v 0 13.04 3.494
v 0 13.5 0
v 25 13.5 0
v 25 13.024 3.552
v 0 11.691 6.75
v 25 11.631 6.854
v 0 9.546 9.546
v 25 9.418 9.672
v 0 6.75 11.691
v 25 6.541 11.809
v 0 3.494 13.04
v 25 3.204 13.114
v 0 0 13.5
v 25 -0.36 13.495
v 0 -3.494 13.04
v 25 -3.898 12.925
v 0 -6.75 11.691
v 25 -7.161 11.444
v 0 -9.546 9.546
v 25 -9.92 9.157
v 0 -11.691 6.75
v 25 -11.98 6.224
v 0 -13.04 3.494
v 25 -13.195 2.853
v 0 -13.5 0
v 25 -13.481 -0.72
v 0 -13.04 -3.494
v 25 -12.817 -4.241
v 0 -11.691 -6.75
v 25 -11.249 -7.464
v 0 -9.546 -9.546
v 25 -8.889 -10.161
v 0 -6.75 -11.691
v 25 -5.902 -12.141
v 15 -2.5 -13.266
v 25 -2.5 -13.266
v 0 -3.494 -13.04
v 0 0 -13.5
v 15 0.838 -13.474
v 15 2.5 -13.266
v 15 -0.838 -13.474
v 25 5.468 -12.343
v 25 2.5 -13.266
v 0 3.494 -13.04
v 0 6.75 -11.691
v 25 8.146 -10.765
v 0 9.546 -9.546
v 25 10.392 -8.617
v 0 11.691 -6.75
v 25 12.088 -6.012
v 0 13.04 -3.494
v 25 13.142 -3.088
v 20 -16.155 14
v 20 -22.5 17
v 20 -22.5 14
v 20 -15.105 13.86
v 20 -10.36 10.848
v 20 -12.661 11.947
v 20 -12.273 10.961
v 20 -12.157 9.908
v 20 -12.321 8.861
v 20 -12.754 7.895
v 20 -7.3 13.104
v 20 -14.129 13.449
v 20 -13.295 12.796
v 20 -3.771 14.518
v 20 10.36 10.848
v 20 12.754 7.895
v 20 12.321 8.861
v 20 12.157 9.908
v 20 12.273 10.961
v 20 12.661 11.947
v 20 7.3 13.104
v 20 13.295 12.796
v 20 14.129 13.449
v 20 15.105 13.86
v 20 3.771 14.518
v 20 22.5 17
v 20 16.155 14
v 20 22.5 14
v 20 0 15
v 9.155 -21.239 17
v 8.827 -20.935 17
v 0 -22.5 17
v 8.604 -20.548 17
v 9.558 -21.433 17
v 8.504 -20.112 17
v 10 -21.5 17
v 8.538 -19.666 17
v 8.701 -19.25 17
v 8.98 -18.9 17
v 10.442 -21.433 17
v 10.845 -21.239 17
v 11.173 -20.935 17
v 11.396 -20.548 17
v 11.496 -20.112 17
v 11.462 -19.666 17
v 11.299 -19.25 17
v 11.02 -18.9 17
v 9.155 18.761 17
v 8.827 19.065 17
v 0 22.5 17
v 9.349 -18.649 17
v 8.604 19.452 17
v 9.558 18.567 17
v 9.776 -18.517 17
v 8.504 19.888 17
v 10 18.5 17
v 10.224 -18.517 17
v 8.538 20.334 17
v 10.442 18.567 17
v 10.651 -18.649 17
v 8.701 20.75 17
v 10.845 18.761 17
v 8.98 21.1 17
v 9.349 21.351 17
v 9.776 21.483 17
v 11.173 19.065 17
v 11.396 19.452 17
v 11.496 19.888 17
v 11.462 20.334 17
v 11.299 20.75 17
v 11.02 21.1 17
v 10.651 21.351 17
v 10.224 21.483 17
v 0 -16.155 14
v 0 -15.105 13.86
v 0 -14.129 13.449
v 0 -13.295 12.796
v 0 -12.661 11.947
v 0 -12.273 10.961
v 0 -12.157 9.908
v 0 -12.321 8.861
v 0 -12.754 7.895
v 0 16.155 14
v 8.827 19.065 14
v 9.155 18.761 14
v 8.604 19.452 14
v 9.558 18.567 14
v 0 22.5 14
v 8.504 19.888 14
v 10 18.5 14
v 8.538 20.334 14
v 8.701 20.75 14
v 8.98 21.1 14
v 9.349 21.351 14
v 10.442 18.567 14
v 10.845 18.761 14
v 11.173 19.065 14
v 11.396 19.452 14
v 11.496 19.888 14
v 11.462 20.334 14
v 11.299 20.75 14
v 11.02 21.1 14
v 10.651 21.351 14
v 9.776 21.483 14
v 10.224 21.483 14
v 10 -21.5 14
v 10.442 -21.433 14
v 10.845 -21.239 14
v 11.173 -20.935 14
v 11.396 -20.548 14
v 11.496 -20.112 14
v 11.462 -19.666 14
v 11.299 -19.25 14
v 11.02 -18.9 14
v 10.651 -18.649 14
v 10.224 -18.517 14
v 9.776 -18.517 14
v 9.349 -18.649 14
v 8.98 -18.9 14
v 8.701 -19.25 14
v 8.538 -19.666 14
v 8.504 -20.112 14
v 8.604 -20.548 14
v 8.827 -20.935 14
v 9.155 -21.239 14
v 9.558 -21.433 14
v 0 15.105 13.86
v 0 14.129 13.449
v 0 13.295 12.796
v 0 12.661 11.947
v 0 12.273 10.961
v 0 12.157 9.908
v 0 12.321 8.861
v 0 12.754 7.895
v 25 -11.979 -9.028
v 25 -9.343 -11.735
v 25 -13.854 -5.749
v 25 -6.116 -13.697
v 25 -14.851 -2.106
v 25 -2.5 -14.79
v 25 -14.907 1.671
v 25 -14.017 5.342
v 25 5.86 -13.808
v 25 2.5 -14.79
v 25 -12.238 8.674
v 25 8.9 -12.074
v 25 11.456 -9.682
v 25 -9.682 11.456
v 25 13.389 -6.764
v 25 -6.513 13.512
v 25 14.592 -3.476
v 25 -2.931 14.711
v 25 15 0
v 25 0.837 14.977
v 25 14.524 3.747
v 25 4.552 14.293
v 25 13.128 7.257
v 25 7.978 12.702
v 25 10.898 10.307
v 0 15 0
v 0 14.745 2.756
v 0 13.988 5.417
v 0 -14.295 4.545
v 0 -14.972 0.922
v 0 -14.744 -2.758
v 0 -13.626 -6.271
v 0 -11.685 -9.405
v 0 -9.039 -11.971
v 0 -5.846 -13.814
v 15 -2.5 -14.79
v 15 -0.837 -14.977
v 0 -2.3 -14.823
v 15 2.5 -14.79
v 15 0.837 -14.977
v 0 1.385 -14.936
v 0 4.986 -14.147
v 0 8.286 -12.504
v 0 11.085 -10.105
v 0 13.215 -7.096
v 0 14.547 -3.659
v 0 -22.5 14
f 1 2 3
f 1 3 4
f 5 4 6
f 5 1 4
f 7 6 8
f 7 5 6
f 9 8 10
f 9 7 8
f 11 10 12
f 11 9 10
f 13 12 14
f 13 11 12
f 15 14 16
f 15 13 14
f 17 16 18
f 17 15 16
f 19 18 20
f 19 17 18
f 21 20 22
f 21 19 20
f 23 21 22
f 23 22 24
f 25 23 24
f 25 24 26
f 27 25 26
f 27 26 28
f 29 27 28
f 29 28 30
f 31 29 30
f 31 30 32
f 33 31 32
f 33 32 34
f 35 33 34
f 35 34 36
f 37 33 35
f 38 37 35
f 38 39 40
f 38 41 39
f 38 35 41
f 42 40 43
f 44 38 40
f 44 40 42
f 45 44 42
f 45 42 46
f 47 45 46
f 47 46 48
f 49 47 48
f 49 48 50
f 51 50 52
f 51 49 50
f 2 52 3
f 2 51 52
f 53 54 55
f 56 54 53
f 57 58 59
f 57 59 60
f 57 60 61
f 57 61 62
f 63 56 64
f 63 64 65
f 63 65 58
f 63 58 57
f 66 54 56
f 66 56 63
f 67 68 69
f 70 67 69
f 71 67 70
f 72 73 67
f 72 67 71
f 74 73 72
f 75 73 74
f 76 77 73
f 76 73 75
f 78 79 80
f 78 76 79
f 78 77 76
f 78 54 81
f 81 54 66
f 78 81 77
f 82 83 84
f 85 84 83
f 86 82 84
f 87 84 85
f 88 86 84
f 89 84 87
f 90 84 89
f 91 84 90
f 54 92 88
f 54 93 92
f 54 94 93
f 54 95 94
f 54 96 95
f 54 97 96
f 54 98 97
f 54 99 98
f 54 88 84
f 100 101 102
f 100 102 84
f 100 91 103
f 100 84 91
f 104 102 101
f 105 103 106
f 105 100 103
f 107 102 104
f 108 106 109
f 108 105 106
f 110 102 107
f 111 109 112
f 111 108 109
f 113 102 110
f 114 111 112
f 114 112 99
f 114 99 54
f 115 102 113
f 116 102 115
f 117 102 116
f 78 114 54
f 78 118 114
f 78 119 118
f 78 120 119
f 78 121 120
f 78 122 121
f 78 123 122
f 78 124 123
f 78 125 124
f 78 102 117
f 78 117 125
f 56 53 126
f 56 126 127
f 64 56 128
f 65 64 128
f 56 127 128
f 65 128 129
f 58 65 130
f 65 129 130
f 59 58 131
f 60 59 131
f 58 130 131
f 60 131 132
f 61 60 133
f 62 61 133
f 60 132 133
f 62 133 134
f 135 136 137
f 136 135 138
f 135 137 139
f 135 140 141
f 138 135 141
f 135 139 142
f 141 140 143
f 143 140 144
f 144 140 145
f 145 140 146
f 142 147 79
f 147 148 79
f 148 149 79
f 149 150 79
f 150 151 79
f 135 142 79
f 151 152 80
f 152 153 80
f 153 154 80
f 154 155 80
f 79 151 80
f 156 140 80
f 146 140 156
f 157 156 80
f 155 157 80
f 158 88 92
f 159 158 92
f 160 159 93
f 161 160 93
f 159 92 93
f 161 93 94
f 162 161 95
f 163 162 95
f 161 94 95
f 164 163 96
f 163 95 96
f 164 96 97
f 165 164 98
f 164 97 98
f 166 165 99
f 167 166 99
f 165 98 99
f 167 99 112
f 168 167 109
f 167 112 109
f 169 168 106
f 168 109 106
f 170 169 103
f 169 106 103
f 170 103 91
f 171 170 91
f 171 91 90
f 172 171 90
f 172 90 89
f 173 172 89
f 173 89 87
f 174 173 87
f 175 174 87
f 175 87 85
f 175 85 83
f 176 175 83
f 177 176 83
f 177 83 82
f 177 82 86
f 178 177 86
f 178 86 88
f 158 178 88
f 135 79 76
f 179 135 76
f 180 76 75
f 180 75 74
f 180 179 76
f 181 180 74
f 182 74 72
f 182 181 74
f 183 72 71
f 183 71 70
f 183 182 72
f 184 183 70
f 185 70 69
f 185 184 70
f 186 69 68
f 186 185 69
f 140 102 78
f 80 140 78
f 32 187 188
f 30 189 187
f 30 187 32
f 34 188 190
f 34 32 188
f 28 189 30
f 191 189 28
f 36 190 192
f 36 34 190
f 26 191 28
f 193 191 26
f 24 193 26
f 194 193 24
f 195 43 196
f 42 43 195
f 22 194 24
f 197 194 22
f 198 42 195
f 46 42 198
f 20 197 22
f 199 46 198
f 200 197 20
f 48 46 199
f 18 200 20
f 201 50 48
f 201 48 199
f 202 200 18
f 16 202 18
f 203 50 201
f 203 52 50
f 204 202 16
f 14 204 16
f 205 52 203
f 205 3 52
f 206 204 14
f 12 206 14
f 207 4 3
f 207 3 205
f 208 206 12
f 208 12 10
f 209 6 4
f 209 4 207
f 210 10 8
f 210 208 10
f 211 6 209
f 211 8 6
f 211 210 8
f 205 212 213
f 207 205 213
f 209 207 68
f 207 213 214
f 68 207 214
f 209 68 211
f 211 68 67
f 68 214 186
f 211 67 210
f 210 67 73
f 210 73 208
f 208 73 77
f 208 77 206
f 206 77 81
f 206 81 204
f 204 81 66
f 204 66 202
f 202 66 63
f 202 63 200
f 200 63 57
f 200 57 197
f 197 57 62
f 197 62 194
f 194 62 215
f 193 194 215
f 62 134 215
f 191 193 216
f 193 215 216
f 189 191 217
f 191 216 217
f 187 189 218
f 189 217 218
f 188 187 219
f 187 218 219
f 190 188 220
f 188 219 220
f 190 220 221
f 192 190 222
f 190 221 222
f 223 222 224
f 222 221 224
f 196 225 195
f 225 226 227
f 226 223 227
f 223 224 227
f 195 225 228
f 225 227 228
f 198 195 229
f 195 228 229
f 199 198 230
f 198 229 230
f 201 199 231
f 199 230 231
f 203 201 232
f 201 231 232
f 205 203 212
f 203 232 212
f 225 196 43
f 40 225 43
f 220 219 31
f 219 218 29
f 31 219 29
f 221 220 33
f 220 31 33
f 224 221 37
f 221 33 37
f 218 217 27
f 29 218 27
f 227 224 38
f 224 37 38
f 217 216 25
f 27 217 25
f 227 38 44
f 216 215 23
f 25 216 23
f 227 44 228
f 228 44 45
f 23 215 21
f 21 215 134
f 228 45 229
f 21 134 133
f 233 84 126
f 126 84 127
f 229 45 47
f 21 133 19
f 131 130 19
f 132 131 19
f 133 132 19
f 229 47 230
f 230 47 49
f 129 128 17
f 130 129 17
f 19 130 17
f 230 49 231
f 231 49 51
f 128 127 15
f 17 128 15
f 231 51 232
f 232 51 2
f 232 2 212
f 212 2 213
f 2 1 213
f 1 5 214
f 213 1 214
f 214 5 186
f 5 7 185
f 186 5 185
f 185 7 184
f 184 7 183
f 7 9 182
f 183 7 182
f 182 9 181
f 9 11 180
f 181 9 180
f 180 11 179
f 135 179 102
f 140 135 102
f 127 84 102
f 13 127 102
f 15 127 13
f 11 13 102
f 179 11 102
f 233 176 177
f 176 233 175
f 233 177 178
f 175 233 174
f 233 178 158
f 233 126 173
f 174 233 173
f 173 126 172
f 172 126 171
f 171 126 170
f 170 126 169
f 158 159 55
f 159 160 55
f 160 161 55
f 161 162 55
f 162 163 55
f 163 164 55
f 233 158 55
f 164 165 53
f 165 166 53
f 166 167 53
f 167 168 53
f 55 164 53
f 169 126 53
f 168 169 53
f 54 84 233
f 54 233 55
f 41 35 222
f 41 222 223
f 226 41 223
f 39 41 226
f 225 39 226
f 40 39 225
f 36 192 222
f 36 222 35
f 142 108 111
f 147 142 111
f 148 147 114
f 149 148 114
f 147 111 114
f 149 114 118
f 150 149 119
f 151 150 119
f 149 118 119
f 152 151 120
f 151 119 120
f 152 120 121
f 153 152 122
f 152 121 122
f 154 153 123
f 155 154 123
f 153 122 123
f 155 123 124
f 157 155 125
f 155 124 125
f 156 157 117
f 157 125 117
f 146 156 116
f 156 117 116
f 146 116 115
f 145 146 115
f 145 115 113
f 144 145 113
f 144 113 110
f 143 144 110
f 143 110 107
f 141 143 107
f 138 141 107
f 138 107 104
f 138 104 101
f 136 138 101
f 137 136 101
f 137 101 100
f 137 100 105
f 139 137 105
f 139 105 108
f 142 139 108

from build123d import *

# Parameters (mm, degrees)
SKETCH_R        = 15
SKETCH_R_2      = 13.5
PAD_DEPTH       = 25
SKETCH001_W     = 5
SKETCH001_H     = 3
POCKET_DEPTH    = 10
SKETCH002_W     = 20
SKETCH002_H     = 45
PAD001_DEPTH    = 3
FILLET_R        = 4
FILLET001_R     = 4
SKETCH003_R     = 1.5
POCKET001_DEPTH = 5


with BuildPart() as part:
    # Sketch → Pad (new body)
    with BuildSketch(Plane.YZ):
        Circle(SKETCH_R)
        Circle(SKETCH_R_2, mode=Mode.SUBTRACT)
    extrude(amount=PAD_DEPTH)

    # Sketch001 (on Face4 of Pad) → Pocket (cut)
    with BuildSketch(Plane.YZ.offset(25)):
        with Locations((0, -14.5)):
            Rectangle(SKETCH001_W, SKETCH001_H)
    extrude(amount=-POCKET_DEPTH, mode=Mode.SUBTRACT)

    # Sketch002 (on DatumPlane) → Pad001 (join)
    with BuildSketch(Plane.XY.offset(17)):
        with Locations((10, 0)):
            Rectangle(SKETCH002_W, SKETCH002_H)
    extrude(amount=-PAD001_DEPTH)

    # Fillet
    fillet_edges = [part.edges().sort_by_distance(p)[0] for p in [
        (10, -5.385165, 14),
    ]]
    fillet(fillet_edges, radius=FILLET_R)

    # Fillet001
    fillet001_edges = [part.edges().sort_by_distance(p)[0] for p in [
        (10, 5.385165, 14),
    ]]
    fillet(fillet001_edges, radius=FILLET001_R)

    # Sketch003 (on Face15 of Fillet001) → Pocket001 (cut)
    with BuildSketch(Plane(origin=(0, 0, 17), x_dir=(0, -1, 0), z_dir=(0, 0, 1))):
        with Locations((-20, 10)):
            Circle(SKETCH003_R)
        with Locations((20, 10)):
            Circle(SKETCH003_R)
    extrude(amount=-POCKET001_DEPTH, mode=Mode.SUBTRACT)


solid = part.part
